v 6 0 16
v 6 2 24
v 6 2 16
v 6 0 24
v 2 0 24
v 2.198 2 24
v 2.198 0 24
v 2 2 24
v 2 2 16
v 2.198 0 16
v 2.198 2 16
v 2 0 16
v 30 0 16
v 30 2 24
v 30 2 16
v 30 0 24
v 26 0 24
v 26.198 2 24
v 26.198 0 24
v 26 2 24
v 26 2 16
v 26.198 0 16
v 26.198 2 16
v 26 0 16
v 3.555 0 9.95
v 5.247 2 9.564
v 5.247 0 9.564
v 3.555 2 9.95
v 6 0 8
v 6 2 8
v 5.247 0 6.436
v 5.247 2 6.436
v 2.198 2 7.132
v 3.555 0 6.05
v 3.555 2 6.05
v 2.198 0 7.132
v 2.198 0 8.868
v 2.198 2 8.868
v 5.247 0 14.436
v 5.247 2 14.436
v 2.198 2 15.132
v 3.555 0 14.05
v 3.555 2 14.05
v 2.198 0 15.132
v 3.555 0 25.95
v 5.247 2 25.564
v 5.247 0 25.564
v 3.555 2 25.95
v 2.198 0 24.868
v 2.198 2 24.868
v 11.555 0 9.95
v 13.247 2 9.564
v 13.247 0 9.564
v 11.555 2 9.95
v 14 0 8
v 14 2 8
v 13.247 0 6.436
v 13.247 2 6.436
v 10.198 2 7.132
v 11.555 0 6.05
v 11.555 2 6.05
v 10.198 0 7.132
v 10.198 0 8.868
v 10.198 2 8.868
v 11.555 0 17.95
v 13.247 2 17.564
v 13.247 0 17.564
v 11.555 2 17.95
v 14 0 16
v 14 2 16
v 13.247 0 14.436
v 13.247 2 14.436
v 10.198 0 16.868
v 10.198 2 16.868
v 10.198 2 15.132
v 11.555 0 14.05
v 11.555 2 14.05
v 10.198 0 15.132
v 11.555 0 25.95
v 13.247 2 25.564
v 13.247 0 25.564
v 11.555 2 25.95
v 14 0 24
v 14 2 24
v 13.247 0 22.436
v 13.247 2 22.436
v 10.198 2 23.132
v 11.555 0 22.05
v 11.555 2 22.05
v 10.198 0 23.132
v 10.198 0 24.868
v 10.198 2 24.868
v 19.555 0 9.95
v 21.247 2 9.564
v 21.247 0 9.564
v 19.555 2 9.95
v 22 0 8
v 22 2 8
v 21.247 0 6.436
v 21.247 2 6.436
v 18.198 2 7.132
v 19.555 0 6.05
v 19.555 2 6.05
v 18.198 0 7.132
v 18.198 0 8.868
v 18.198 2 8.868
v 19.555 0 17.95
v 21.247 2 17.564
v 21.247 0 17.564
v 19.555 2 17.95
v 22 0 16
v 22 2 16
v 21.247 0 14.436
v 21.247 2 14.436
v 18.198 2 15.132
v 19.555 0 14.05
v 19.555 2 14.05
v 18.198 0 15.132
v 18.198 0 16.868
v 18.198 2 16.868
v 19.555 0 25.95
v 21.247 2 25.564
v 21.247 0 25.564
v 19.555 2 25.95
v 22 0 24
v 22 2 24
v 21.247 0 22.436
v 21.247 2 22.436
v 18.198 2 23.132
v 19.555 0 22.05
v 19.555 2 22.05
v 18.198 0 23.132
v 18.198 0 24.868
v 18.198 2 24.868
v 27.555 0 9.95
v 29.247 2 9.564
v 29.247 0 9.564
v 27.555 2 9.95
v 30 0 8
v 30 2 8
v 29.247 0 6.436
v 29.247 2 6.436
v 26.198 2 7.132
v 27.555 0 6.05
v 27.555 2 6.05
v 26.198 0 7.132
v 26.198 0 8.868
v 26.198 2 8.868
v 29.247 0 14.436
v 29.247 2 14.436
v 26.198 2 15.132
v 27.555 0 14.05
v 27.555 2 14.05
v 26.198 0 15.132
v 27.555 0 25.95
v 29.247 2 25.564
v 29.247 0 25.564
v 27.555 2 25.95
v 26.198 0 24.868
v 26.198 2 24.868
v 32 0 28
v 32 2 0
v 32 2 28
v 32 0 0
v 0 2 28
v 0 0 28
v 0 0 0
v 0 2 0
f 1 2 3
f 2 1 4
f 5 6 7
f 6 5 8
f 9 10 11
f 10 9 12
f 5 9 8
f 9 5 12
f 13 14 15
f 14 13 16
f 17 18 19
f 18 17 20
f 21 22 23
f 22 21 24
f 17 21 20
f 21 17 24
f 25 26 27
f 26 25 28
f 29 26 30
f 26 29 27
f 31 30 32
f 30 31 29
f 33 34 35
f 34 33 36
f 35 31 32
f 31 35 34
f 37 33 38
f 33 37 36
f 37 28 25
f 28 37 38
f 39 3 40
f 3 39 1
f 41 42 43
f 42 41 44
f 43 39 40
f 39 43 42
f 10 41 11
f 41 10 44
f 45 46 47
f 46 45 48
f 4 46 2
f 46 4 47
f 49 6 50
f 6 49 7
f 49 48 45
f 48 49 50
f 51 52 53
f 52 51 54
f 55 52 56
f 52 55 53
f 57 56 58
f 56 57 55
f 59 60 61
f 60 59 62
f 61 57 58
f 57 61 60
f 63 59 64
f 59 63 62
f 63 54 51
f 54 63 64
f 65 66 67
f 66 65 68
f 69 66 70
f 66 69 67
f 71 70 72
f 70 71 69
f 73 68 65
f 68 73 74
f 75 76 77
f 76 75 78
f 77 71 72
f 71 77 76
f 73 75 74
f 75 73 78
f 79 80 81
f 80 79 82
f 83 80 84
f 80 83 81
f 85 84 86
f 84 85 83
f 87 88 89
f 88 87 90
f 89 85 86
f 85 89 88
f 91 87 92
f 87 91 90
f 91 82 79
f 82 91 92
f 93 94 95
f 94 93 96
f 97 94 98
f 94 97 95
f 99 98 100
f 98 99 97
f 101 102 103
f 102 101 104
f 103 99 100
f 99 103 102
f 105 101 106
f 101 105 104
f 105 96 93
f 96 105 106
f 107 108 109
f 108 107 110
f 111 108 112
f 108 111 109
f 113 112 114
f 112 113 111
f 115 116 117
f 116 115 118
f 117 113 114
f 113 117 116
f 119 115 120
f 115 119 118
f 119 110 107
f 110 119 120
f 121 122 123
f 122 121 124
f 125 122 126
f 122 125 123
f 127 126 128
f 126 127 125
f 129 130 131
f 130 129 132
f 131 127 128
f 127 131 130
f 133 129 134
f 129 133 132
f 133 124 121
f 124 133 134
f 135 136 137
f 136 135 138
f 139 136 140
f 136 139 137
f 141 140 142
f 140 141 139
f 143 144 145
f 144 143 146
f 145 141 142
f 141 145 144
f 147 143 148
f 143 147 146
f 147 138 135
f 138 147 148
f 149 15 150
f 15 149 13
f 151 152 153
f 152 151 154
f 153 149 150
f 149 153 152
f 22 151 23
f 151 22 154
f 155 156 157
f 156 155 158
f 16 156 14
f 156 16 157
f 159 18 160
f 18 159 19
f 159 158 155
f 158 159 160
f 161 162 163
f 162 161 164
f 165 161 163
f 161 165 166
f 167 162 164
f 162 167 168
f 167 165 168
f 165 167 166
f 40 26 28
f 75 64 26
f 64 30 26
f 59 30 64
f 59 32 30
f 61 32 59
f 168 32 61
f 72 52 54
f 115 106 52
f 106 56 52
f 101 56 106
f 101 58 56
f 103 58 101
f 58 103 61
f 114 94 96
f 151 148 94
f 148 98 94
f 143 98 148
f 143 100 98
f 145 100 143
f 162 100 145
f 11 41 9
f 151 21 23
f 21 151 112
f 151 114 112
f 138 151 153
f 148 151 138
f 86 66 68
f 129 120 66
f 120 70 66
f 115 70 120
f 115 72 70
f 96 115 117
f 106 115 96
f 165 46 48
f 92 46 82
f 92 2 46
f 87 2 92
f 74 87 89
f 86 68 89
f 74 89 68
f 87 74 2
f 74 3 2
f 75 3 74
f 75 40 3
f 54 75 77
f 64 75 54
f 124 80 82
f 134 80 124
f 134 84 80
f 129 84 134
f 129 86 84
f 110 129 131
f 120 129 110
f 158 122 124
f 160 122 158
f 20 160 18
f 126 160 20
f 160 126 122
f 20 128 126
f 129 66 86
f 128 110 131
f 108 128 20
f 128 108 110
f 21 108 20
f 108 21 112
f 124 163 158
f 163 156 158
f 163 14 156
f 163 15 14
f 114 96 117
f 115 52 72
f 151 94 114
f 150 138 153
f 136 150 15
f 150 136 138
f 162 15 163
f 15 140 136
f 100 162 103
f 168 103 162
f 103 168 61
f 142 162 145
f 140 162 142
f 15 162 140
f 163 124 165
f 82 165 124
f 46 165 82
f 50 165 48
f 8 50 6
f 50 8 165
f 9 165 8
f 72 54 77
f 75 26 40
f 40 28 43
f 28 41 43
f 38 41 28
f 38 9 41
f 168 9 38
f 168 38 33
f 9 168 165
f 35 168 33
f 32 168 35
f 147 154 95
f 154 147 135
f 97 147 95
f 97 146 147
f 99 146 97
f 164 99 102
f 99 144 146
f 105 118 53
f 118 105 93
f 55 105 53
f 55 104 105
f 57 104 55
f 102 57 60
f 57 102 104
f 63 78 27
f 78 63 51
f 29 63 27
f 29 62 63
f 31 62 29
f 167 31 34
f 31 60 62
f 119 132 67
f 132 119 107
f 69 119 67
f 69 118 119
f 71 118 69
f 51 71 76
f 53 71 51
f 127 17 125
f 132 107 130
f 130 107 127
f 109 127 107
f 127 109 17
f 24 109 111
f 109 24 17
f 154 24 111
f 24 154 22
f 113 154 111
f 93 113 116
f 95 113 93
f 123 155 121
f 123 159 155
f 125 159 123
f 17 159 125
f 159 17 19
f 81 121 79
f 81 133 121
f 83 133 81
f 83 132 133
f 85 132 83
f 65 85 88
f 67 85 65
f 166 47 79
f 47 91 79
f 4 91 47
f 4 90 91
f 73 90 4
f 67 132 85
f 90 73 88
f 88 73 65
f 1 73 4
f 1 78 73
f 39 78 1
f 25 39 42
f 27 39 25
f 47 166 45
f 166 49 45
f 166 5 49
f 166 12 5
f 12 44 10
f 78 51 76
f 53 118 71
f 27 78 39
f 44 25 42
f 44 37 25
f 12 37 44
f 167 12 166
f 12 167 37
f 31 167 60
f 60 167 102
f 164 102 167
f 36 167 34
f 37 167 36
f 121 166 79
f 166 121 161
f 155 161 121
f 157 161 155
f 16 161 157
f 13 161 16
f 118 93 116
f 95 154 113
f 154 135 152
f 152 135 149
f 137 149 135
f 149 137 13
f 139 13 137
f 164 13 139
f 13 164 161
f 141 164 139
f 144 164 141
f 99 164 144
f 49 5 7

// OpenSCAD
// piece configuration
nb_rangees = 4;
epaisseur = 2;

// home configuration
hole = 4;
space = 4;
pad = space / 2;


difference(){

    cube([8*nb_rangees,epaisseur,28]);



    
union(){
    translate([2, -1, 16]){
        cube([4, epaisseur+2, 8]);
        };
    translate([7*nb_rangees-2, -1, 16]){
        cube([4, epaisseur+2, 8]);
        }
    };
    
translate([2.67,6,0]){
    cylinder(h=epaisseur+2, r=1.5);
    };

translate([8*nb_rangees-2.67,6,0]){
    cylinder(h=epaisseur+2, r=1.5);
    };

translate([0,epaisseur+1,0]){   
    rotate([90,0,0]){
        union(){
            for(i=[0:nb_rangees-1]){
                for(j=[0:2]){
                    translate([4+ 8*i, 8+8*j, 0]){cylinder(h=epaisseur+2, r=2);}
                }
            }
        }
    }
}


}
